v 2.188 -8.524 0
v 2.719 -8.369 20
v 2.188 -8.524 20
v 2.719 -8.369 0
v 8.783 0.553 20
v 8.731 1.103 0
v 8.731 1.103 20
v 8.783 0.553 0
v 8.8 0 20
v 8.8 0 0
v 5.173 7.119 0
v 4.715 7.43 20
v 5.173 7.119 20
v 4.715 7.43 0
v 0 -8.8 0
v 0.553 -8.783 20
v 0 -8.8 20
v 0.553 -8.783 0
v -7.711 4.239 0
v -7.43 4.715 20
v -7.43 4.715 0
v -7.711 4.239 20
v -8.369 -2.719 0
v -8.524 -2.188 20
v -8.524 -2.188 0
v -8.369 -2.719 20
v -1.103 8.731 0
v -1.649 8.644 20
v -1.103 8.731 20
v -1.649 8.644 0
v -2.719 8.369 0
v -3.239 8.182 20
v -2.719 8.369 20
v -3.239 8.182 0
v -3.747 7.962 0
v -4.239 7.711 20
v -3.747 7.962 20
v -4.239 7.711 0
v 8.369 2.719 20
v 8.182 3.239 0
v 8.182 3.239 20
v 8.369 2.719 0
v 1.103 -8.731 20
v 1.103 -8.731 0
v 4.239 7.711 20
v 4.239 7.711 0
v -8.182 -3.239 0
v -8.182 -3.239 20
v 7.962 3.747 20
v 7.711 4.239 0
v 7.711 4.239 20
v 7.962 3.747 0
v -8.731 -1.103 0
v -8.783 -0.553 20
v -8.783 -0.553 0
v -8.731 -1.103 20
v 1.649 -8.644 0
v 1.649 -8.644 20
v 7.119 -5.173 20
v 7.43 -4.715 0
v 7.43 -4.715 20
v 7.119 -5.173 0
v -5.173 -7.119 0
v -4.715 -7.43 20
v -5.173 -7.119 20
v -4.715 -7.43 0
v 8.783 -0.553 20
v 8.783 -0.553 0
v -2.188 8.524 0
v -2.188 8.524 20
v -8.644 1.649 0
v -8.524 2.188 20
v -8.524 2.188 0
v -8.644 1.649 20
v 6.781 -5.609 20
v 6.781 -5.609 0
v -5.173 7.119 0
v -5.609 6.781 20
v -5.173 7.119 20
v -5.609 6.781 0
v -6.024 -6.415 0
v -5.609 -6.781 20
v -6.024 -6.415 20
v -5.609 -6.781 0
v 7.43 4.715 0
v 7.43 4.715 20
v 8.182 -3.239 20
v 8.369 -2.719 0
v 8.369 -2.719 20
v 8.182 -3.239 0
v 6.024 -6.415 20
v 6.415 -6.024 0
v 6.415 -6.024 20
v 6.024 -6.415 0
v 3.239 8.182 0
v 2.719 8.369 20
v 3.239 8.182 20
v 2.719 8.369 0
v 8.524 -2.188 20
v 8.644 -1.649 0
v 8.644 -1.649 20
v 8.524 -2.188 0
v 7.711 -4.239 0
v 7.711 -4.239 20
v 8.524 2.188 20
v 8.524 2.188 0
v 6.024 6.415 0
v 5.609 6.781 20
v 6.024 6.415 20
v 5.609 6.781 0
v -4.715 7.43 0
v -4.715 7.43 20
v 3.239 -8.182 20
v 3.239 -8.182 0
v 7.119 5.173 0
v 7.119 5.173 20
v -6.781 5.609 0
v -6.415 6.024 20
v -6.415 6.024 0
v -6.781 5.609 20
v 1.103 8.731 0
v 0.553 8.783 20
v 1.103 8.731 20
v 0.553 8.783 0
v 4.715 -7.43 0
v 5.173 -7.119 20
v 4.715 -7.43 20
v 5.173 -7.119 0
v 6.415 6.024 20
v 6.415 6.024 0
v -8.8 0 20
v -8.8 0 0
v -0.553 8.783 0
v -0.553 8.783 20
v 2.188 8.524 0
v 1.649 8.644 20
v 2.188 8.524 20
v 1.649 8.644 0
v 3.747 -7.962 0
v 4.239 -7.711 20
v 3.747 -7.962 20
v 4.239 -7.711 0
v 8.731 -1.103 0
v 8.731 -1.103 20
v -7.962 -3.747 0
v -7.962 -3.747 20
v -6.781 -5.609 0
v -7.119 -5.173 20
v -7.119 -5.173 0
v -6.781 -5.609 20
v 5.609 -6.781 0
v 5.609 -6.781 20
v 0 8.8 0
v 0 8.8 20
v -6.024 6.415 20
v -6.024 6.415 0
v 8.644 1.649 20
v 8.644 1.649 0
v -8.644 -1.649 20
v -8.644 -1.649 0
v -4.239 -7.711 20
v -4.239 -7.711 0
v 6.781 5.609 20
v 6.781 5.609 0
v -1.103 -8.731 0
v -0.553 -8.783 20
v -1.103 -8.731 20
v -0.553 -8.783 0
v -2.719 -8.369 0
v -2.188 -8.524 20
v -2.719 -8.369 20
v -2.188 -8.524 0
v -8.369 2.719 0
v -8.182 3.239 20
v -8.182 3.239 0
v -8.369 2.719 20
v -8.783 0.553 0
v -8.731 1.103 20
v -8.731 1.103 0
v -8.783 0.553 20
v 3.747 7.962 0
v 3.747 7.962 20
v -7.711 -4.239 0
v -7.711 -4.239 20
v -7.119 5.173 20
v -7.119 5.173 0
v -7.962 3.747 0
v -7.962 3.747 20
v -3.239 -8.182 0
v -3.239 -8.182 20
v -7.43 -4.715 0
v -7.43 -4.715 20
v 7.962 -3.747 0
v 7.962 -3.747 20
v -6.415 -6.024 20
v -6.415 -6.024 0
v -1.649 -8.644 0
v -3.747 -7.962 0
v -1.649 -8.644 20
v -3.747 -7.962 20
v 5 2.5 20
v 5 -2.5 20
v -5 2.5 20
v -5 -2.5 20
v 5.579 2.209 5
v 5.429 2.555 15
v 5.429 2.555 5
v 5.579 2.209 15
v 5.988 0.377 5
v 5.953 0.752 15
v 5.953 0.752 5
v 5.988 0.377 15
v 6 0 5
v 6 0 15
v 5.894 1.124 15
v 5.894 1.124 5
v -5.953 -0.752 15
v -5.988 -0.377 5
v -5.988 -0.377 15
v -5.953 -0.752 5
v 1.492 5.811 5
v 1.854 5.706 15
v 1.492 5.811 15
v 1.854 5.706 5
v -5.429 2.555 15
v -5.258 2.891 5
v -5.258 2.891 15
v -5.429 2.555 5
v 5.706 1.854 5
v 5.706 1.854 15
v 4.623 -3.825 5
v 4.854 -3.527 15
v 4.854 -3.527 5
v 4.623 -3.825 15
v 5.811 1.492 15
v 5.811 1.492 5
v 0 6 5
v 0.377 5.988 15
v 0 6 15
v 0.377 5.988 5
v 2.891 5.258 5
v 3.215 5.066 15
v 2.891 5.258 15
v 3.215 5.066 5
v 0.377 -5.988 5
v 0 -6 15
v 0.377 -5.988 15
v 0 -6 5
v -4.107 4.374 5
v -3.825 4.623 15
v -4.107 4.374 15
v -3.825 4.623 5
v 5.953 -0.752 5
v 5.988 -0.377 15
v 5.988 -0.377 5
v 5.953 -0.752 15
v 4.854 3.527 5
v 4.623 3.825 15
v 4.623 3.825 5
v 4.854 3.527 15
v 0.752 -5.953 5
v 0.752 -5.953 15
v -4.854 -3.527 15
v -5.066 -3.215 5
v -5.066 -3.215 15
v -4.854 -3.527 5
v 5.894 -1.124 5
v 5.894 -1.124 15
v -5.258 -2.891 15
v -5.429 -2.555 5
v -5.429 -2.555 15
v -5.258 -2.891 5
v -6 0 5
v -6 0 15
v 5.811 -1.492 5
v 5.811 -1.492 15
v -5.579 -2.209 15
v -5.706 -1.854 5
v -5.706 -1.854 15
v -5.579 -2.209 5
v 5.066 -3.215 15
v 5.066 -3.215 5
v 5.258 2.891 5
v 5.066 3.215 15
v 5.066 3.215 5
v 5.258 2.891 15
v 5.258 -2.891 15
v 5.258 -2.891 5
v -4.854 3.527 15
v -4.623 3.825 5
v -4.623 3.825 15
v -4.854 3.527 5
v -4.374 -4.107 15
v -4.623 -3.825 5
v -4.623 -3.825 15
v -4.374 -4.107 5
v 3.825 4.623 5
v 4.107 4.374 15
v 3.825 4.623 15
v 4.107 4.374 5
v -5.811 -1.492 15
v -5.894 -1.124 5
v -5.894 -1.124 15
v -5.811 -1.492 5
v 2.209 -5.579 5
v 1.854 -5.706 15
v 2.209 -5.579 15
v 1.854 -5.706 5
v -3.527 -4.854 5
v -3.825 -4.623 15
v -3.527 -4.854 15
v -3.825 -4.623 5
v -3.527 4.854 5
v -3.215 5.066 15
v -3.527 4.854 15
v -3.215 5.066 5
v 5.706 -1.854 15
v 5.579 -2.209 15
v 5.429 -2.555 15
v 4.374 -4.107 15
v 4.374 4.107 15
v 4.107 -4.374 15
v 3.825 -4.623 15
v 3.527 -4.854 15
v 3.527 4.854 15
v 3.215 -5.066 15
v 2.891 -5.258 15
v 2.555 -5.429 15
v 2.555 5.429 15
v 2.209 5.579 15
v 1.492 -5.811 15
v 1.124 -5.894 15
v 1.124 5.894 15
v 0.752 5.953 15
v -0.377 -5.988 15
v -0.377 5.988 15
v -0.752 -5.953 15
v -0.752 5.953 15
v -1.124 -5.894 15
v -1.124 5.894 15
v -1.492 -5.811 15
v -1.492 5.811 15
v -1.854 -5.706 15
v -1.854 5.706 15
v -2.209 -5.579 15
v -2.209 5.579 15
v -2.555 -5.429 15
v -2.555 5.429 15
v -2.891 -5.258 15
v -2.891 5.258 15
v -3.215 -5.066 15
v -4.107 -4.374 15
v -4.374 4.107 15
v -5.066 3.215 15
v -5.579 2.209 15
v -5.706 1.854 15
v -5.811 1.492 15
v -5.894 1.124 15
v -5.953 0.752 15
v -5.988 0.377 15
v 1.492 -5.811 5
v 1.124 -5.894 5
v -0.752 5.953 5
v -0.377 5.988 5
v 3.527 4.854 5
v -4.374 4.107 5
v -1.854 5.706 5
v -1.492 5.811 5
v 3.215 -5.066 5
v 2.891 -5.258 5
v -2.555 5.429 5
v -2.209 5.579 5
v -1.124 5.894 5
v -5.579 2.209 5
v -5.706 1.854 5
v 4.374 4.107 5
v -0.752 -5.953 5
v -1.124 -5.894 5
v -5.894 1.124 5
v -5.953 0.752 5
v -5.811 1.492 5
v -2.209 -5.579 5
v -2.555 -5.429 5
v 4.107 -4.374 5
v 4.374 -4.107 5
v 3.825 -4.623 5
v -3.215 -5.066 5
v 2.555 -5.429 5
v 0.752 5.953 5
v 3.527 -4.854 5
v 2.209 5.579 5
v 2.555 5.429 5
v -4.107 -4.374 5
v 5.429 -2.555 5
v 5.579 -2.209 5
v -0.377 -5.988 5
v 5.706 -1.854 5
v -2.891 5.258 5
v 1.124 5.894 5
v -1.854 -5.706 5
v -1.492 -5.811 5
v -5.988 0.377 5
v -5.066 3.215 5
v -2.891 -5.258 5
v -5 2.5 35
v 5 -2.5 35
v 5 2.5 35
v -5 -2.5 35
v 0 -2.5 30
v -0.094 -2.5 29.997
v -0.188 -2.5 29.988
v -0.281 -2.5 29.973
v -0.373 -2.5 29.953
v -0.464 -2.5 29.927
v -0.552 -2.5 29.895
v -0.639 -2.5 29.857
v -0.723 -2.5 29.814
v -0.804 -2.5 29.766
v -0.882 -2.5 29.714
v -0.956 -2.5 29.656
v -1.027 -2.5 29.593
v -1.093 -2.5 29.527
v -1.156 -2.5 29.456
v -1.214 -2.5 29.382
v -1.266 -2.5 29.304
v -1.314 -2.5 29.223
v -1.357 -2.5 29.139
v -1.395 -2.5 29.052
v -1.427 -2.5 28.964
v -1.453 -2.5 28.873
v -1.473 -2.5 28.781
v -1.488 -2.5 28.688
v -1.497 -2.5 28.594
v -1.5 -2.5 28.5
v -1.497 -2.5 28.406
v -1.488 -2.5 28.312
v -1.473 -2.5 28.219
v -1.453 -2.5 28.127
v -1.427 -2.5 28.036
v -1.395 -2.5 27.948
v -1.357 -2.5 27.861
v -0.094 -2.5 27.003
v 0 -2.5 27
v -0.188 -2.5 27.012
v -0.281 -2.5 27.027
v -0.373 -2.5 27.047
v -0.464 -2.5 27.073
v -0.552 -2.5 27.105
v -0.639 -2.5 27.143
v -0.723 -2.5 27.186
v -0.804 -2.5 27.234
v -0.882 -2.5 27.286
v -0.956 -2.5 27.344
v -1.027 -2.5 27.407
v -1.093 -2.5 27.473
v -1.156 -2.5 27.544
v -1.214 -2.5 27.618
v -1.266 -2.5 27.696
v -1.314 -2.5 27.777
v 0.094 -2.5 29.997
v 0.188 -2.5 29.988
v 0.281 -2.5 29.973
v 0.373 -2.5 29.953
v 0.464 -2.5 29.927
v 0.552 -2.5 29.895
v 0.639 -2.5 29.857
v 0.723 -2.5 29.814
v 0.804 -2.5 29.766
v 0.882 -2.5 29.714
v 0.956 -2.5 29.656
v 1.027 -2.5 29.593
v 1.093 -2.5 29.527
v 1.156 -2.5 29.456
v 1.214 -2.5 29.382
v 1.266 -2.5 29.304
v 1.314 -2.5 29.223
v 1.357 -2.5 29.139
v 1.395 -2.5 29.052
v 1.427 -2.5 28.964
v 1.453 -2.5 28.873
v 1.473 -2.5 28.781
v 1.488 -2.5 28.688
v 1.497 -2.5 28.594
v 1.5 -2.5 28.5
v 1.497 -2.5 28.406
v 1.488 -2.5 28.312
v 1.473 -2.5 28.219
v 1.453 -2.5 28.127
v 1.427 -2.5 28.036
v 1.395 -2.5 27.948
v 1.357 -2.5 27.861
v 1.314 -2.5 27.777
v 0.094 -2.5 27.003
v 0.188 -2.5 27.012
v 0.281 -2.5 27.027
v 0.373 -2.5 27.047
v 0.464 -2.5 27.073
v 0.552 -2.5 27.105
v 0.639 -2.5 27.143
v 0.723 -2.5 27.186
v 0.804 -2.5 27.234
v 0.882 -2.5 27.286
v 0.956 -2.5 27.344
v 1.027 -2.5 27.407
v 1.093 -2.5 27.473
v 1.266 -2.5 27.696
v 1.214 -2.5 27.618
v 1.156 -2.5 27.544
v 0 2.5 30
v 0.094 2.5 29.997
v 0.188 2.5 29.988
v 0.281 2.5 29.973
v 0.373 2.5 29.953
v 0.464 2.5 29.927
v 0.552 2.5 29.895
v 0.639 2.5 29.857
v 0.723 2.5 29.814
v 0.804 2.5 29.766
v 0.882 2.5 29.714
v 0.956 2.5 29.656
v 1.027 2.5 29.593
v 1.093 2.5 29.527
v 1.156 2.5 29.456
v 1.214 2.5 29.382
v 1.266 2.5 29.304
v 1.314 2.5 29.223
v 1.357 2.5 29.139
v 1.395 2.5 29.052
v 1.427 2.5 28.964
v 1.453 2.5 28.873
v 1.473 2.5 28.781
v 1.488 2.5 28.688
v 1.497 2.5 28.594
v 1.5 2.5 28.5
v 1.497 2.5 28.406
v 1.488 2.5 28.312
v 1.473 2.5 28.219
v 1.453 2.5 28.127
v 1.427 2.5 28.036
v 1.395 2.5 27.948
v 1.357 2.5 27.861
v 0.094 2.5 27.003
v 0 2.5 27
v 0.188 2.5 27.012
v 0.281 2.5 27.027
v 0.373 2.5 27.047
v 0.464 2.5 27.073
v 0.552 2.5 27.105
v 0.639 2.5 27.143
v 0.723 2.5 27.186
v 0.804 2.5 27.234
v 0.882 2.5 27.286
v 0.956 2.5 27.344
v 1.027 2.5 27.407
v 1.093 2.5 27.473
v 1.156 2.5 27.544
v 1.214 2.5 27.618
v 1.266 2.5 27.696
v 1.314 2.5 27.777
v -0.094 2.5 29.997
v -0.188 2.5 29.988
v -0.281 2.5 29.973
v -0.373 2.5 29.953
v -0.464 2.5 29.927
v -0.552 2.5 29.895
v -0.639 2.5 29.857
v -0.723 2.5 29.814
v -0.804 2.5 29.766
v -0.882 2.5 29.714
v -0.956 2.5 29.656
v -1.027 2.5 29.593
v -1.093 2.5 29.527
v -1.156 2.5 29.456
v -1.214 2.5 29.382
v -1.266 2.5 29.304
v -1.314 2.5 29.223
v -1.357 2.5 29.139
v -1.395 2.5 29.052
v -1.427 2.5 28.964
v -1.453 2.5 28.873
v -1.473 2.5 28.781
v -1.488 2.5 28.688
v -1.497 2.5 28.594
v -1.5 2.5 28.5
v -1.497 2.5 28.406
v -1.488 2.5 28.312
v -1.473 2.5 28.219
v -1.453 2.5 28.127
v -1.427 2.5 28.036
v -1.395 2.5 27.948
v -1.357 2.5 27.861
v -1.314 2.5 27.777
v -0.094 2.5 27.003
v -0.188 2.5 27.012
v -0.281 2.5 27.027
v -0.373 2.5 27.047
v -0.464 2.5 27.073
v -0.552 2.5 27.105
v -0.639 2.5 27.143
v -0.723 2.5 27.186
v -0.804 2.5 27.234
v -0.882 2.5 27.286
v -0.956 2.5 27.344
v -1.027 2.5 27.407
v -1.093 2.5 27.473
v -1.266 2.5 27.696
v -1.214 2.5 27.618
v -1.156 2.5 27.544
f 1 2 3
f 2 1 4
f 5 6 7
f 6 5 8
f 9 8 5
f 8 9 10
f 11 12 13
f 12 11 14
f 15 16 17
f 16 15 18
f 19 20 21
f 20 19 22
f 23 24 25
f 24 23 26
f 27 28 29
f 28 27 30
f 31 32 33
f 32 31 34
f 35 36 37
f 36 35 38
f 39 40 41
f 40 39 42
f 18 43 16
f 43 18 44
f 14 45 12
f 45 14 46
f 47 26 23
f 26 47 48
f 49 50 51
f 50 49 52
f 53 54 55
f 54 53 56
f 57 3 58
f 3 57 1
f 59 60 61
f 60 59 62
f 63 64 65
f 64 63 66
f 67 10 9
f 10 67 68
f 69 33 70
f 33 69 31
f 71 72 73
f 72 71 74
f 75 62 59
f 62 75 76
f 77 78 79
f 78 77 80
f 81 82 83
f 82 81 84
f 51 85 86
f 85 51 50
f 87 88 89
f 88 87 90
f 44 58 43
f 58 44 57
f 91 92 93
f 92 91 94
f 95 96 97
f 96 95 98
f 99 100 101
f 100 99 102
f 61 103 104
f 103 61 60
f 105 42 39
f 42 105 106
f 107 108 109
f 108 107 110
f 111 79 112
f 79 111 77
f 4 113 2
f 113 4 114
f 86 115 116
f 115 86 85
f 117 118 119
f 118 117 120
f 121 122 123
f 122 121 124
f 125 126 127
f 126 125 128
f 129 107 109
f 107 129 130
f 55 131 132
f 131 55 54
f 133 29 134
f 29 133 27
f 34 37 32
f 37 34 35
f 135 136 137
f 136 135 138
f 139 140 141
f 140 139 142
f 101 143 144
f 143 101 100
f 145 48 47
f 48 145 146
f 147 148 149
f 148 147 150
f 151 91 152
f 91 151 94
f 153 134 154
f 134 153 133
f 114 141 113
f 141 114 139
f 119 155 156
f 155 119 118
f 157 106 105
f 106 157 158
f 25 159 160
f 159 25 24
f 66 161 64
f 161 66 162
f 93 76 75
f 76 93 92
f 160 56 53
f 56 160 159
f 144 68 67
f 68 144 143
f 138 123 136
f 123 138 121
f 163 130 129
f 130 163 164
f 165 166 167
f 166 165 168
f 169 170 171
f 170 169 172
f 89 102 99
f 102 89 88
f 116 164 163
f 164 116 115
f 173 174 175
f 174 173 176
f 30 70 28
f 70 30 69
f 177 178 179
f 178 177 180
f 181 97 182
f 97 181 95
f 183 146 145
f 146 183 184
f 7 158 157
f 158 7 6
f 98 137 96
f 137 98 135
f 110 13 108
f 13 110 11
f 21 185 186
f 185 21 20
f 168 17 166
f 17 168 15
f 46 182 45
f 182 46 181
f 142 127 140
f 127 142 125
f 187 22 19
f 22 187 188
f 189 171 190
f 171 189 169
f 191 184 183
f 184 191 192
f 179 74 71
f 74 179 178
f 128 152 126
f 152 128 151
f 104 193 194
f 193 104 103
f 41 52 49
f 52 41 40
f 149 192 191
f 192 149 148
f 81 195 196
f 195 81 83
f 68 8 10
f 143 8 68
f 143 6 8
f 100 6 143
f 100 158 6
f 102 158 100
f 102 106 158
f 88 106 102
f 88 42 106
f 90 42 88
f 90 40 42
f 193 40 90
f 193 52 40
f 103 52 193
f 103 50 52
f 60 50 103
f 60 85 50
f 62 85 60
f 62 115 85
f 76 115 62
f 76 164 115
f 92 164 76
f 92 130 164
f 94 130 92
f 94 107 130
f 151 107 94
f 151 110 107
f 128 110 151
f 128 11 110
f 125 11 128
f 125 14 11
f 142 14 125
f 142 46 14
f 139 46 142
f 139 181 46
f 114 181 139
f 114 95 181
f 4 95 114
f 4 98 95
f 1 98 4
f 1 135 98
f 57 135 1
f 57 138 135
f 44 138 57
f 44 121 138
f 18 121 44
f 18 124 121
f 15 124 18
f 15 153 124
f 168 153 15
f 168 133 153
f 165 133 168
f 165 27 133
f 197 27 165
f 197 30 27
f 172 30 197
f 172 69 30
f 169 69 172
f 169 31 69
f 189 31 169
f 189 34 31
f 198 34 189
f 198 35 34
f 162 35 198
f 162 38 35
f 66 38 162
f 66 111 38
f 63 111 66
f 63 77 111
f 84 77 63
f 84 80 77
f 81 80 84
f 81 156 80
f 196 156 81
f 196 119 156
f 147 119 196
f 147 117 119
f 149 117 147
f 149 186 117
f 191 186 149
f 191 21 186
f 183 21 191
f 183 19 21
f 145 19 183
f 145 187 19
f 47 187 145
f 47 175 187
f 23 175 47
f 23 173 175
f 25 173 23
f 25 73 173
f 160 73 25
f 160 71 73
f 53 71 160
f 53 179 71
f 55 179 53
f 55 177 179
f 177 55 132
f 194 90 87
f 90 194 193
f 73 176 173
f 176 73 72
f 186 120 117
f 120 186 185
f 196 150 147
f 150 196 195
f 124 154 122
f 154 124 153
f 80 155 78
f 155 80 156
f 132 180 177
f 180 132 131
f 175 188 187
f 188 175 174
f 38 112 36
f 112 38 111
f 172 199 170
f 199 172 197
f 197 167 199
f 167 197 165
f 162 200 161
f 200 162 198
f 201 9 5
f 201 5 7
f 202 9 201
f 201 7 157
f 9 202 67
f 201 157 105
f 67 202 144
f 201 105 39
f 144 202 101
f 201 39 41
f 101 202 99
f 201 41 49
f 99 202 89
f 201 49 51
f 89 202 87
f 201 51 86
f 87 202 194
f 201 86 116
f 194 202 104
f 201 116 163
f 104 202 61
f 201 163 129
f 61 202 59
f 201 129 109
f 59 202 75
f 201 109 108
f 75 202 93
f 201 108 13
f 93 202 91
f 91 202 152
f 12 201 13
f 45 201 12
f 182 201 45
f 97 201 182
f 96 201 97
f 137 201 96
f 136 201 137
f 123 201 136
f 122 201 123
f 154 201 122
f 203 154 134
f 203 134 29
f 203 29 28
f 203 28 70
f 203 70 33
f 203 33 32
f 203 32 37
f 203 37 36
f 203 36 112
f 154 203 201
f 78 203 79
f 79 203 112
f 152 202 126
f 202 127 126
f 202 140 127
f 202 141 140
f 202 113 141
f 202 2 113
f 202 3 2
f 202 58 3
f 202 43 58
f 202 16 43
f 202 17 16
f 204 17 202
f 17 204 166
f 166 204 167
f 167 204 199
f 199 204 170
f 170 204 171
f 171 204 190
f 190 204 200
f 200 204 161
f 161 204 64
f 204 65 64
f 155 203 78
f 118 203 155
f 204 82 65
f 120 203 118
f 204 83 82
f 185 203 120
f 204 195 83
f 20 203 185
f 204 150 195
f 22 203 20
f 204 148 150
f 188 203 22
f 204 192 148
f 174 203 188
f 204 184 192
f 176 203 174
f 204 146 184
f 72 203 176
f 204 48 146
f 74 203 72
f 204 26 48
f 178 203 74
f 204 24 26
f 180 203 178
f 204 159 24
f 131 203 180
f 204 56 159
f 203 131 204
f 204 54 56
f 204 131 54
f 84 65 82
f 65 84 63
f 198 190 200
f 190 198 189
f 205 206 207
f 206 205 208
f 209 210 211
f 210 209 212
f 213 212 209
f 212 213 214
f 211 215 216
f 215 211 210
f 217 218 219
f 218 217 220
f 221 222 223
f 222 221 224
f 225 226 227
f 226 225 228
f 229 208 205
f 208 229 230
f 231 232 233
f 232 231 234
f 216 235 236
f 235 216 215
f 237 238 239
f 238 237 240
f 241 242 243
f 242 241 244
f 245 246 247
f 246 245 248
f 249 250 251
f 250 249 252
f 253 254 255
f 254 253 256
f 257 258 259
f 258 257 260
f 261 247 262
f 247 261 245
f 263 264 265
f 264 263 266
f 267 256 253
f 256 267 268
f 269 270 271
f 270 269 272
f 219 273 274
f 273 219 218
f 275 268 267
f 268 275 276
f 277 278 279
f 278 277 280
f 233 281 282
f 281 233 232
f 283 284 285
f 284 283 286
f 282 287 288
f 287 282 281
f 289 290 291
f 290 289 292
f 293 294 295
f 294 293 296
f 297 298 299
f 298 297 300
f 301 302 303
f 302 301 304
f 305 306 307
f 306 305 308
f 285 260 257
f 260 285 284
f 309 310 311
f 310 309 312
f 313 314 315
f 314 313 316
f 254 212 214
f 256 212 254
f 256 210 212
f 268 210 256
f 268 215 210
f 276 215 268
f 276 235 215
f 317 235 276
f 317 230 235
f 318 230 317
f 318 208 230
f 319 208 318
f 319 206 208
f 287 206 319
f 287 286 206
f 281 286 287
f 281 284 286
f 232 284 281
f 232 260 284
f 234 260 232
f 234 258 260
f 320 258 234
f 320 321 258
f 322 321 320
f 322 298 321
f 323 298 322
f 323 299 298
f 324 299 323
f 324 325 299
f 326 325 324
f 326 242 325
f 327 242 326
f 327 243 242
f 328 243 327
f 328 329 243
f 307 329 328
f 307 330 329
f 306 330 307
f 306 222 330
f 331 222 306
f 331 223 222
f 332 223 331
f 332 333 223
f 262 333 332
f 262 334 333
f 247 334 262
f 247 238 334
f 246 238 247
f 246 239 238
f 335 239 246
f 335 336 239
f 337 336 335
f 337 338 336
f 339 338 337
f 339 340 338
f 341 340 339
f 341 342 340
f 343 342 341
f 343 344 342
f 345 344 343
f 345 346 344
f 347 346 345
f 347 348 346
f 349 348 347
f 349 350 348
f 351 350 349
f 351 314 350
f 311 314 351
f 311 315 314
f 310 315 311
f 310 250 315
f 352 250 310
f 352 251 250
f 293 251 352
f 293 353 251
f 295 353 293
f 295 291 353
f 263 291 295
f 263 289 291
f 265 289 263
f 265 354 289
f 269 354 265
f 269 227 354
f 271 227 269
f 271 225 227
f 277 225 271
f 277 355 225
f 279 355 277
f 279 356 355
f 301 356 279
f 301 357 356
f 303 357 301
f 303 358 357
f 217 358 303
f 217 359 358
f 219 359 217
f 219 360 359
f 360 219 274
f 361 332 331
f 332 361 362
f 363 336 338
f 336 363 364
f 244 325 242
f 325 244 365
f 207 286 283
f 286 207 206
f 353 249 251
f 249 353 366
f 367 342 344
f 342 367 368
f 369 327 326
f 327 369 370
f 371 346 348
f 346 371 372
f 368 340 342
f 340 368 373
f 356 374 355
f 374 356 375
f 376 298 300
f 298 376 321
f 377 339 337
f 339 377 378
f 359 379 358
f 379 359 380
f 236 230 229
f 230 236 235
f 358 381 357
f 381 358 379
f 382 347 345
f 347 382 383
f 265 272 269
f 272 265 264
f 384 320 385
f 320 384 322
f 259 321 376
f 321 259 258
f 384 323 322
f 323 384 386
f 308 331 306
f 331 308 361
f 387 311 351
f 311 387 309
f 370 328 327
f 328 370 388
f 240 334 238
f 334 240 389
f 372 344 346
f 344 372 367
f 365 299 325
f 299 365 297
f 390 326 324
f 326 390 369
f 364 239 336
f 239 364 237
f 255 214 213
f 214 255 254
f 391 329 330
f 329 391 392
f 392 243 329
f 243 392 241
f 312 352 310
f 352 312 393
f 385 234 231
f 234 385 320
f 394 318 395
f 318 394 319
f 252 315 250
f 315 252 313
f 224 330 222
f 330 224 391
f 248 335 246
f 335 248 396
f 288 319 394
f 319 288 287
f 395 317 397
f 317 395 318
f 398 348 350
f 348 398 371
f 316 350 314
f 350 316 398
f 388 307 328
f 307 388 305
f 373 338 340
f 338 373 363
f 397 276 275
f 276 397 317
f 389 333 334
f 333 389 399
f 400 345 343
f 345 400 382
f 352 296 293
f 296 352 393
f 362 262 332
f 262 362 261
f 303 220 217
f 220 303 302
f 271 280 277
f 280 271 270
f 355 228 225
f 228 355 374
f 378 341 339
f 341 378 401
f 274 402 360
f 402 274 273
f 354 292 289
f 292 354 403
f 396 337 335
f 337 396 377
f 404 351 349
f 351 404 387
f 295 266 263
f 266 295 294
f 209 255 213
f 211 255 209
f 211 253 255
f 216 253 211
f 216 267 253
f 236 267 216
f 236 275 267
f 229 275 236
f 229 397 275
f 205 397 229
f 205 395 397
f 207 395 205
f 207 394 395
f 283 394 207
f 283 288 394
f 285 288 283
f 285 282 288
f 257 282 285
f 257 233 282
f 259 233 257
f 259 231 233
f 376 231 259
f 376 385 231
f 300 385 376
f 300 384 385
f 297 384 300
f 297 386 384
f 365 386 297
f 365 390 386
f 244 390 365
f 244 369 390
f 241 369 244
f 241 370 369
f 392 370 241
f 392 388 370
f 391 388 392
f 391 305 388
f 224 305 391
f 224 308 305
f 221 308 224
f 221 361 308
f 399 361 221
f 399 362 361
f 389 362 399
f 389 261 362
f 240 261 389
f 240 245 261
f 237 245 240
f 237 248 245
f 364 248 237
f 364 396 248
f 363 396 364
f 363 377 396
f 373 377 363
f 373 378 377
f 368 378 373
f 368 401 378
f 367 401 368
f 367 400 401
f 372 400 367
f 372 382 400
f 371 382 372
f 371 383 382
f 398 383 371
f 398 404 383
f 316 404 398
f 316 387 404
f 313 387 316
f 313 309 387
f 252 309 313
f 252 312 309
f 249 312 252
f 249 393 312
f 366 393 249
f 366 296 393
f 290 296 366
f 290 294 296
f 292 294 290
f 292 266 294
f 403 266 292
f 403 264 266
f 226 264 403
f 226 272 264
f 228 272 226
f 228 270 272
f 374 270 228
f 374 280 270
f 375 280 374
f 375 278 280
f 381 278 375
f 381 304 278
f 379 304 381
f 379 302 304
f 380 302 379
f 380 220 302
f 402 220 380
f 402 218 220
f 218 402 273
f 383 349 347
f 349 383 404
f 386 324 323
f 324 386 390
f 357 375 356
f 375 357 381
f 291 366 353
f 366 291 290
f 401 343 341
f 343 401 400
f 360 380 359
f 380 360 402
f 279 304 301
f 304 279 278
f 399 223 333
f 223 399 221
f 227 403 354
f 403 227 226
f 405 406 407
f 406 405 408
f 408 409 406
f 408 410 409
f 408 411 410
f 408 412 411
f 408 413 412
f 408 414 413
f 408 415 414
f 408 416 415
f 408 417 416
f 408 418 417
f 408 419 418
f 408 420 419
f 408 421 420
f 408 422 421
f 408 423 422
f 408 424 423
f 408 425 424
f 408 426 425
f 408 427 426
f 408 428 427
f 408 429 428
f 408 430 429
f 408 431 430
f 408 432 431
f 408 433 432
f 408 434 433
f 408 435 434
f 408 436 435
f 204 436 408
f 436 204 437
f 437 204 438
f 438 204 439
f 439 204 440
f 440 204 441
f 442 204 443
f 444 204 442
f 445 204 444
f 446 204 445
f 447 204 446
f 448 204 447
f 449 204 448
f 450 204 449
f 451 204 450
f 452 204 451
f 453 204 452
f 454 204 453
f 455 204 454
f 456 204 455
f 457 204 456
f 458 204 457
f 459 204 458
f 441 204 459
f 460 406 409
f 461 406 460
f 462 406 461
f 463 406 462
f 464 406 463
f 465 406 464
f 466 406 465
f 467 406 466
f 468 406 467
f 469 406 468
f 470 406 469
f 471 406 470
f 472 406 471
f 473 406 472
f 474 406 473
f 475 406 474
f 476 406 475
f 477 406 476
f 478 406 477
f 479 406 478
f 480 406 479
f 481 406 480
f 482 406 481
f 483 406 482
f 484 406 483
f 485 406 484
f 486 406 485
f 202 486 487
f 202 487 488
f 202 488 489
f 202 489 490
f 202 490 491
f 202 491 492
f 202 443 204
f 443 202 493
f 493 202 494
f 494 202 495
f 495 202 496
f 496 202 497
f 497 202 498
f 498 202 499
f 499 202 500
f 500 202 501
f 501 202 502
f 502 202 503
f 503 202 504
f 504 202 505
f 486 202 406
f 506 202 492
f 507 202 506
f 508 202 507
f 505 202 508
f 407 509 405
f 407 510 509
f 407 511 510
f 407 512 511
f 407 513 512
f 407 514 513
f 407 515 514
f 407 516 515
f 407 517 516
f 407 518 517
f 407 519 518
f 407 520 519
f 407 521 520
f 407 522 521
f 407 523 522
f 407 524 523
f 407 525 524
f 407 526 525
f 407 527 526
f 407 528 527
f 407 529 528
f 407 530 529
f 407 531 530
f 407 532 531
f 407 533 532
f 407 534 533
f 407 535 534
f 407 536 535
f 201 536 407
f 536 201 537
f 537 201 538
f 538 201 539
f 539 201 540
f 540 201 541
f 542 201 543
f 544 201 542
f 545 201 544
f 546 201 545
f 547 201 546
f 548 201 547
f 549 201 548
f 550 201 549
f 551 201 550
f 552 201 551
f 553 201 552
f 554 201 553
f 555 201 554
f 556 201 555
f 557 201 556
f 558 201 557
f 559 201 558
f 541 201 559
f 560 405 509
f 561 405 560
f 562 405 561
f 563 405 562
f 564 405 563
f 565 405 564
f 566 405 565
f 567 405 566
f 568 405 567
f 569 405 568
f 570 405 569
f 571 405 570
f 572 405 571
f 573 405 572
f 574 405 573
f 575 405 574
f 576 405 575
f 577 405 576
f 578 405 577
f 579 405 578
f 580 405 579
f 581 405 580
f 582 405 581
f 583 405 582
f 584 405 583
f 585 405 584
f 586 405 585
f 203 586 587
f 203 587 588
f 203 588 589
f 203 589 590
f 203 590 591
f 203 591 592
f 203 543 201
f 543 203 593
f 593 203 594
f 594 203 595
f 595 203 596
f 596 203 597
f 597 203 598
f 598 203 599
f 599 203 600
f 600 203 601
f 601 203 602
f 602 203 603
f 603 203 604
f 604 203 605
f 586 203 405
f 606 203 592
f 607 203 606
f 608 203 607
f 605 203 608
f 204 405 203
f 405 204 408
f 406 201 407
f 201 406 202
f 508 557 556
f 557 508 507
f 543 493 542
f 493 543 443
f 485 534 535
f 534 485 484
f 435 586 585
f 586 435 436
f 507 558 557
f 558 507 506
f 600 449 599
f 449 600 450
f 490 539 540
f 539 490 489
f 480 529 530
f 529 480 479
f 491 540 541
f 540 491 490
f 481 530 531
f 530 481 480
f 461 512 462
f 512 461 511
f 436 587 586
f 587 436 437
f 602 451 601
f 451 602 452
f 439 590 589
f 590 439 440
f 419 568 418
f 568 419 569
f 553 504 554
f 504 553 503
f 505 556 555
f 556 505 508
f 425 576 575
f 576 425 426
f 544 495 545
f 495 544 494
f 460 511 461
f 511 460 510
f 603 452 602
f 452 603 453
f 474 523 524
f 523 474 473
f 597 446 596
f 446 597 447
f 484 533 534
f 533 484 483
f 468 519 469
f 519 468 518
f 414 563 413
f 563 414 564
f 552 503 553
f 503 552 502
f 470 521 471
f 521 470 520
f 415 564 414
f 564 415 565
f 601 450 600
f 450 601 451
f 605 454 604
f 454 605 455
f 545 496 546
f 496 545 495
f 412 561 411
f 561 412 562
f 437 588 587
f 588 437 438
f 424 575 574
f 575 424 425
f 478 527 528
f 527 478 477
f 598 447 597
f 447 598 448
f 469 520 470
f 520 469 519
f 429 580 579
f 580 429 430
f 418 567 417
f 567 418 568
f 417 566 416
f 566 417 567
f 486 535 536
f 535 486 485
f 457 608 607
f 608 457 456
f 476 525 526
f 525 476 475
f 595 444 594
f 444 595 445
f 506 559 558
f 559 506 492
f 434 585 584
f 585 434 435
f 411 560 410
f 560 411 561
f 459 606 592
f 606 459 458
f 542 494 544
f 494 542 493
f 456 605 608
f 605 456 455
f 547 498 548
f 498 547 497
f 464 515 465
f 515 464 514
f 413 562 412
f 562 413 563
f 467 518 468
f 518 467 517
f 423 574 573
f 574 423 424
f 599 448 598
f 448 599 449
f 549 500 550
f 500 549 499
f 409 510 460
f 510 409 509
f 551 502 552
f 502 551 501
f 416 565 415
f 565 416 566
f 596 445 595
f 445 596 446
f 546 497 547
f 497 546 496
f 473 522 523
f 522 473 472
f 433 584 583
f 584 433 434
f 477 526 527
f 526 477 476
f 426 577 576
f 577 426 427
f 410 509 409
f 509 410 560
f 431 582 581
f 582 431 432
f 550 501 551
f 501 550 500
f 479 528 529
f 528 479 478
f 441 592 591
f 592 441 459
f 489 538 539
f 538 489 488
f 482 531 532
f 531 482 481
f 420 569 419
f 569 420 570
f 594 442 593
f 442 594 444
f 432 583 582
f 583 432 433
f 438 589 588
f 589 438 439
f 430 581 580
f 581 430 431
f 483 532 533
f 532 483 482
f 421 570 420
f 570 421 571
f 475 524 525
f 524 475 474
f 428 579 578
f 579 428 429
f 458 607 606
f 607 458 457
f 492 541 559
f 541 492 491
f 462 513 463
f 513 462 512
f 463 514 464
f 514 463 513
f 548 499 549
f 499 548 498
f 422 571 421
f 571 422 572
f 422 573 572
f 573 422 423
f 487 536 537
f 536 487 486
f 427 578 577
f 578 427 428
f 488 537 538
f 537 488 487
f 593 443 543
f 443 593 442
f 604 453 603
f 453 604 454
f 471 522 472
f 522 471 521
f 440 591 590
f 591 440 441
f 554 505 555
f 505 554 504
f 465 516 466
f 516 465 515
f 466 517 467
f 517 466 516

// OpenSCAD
//*******************************************************
// ********** Prusa Rounded Clip by MacFly **************
// **            made dec 02 2015                      **
//*******************************************************

//--------------------------------------------------------------------------------------//
/* [cylinder] */
// Cylinder height mm - Hauteur du cylindre en mm. Default 20
CYLINDER_HEIGHT = 20;   // [10:100]         
// Cylinder radius mm - Rayon du cylindre en mm. Default 17.6mm (8.80 x 2 )
CYLINDER_RADIUS = 8.80; //[6:0.01:10]   
/* [Tab] */
//  Tab length - Longueur de la languette en mm. Default 15
TAB_LENGTH = 15;   // [10:1:100]         
// 5mm thickness - Epaisseur de la languette. Default 5
TAB_THICKNESS = 5;  // [5:0.5:10 ]     
// Tab width mm - Largeur de la languette en mm
TAB_WIDTH = 10; // [5:1:20]   
/* [Screw] */
// screw hole radius - Rayon du trou pour la vis
SCREW_HOLE_RADIUS = 1.5; //[0:0.1:5]
// tab screw hole 5mm from the edge - distance du trou 5mm du bord extérieur
SCREW_HOLE_OFFSET = 5; // [1:100 ]
/* [Body] */
// Default 1.4mm shell thickness |  Epaisseur de la coque du cylindre
SHELL_THICKNESS = 1.4; 

/* [Hidden] */
$fn = 100;
EXTRUSION_THICKNESS = CYLINDER_RADIUS - SHELL_THICKNESS * 2;

module cylindre()
    {
    difference()
        {
                cylinder(r=CYLINDER_RADIUS, h=CYLINDER_HEIGHT);
                translate([0,0,5]) extruCylinder();
        }
    }
    
module extruCylinder()
    {
                cylinder(r=EXTRUSION_THICKNESS, h=CYLINDER_HEIGHT - 10);  
    }
    
module  tab()
    {
     difference() {
                  
            translate([0,0,0]) rotate([90,90,0]) cube([TAB_LENGTH,TAB_WIDTH,TAB_THICKNESS]);
            translate([TAB_WIDTH/2, 75, -SCREW_HOLE_OFFSET - 1.5]) rotate([90,90,0]) cylinder(r=SCREW_HOLE_RADIUS,h=150);
     }
  }

cylindre();
translate([-TAB_WIDTH/2,TAB_THICKNESS/2,CYLINDER_HEIGHT + TAB_LENGTH]) tab();

